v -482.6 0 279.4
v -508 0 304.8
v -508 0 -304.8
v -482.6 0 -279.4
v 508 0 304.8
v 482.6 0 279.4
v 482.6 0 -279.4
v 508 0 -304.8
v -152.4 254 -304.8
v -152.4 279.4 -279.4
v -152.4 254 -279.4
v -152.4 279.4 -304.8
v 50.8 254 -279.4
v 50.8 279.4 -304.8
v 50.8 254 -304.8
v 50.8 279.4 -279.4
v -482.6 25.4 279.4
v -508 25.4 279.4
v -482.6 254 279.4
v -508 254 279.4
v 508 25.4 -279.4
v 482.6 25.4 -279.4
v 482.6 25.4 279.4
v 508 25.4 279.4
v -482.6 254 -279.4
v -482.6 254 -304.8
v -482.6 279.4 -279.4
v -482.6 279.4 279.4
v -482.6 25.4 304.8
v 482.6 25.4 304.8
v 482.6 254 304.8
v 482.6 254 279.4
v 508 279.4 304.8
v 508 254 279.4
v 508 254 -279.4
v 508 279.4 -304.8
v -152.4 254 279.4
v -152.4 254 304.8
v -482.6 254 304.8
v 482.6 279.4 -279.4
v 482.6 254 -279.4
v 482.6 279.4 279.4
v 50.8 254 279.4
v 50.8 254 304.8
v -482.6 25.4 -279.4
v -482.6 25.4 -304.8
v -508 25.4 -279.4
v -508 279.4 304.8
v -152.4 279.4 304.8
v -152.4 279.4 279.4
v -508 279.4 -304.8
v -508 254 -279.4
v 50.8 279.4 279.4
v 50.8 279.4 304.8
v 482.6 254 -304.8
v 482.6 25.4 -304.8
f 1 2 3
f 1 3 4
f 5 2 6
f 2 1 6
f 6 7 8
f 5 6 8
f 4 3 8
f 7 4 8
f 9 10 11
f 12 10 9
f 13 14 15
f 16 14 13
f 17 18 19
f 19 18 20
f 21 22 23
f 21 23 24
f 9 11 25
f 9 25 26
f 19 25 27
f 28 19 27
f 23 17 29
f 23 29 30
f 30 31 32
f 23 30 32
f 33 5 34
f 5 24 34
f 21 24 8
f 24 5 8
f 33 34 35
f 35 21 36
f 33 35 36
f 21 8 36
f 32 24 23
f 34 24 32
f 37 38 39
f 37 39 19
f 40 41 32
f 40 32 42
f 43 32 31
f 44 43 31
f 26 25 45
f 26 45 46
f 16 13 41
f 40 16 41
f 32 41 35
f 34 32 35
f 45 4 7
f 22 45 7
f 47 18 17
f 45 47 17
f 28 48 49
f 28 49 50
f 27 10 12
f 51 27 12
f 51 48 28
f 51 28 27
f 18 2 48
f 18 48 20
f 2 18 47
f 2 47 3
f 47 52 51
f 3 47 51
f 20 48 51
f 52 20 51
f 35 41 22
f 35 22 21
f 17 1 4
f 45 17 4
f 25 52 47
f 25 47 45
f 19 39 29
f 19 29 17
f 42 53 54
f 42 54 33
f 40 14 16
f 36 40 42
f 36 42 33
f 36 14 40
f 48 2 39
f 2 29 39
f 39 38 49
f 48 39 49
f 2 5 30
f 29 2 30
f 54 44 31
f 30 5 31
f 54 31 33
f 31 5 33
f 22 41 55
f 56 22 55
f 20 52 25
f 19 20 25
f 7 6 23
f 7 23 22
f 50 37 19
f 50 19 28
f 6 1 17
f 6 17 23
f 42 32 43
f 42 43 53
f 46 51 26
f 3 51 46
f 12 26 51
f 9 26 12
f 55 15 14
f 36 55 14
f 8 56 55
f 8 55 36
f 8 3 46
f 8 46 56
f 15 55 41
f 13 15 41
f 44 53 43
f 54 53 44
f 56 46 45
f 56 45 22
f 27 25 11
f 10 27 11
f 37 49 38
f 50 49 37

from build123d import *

# Parameters (mm, degrees)
SKETCH3_W                = 1016
SKETCH3_H                = 609.6
SKETCH3_W_2              = 965.2
SKETCH3_H_2              = 558.8
BOSS_EXTRUDE1_DEPTH      = 25.4
SKETCH4_W                = 25.4
SKETCH4_H                = 25.4
BOSS_EXTRUDE2_DEPTH      = 228.6
BOSS_EXTRUDE3_DEPTH      = 330.2
BOSS_EXTRUDE3_DEPTH_BACK = 25.4
SKETCH6_W                = 25.4
SKETCH6_H                = 25.4
BOSS_EXTRUDE4_DEPTH      = 431.8
BOSS_EXTRUDE4_DEPTH_BACK = 25.4
SKETCH7_W                = 25.4
SKETCH7_H                = 25.4
SKETCH8_W                = 25.4
SKETCH8_H                = 25.4
BOSS_EXTRUDE5_DEPTH      = 558.8


with BuildPart() as part:
    # Sketch3 → Boss-Extrude1 (new body)
    with BuildSketch(Plane(origin=(0, 0, 0), x_dir=(1, 0, 0), z_dir=(0, 1, 0))):
        Rectangle(SKETCH3_W, SKETCH3_H)
        Rectangle(SKETCH3_W_2, SKETCH3_H_2, mode=Mode.SUBTRACT)
    extrude(amount=BOSS_EXTRUDE1_DEPTH)

    # Sketch4 → Boss-Extrude2 (add)
    with BuildSketch(Plane(origin=(0, 25.4, 0), x_dir=(1, 0, 0), z_dir=(0, 1, 0))):
        with Locations((-495.3, 292.1)):
            Rectangle(SKETCH4_W, SKETCH4_H)
        with Locations((495.3, 292.1)):
            Rectangle(SKETCH4_W, SKETCH4_H)
        with Locations((495.3, -292.1)):
            Rectangle(SKETCH4_W, SKETCH4_H)
        with Locations((-495.3, -292.1)):
            Rectangle(SKETCH4_W, SKETCH4_H)
    extrude(amount=BOSS_EXTRUDE2_DEPTH)

    # Sketch6 → Boss-Extrude3 (add, two sides: drawn at the far end of the back side and taken through both)
    with BuildSketch(Plane(origin=(-482.6, 0, 0), x_dir=(0, 0, -1), z_dir=(1, 0, 0)).offset(-BOSS_EXTRUDE3_DEPTH_BACK)):
        with Locations((-292.1, 266.7)):
            Rectangle(SKETCH6_W, SKETCH6_H)
        with Locations((292.1, 266.7)):
            Rectangle(SKETCH6_W, SKETCH6_H)
    extrude(amount=BOSS_EXTRUDE3_DEPTH + BOSS_EXTRUDE3_DEPTH_BACK)

    # Sketch7 → Boss-Extrude4 (add, two sides: drawn at the far end of the back side and taken through both)
    with BuildSketch(Plane.ZY.offset(-482.6).offset(-BOSS_EXTRUDE4_DEPTH_BACK)):
        with Locations((292.1, 266.7)):
            Rectangle(SKETCH7_W, SKETCH7_H)
        with Locations((-292.1, 266.7)):
            Rectangle(SKETCH7_W, SKETCH7_H)
    extrude(amount=BOSS_EXTRUDE4_DEPTH + BOSS_EXTRUDE4_DEPTH_BACK)

    # Sketch8 → Boss-Extrude5 (add)
    with BuildSketch(Plane.XY.offset(-279.4)):
        with Locations((495.3, 266.7)):
            Rectangle(SKETCH8_W, SKETCH8_H)
        with Locations((-495.3, 266.7)):
            Rectangle(SKETCH8_W, SKETCH8_H)
    extrude(amount=BOSS_EXTRUDE5_DEPTH)


solid = part.part
